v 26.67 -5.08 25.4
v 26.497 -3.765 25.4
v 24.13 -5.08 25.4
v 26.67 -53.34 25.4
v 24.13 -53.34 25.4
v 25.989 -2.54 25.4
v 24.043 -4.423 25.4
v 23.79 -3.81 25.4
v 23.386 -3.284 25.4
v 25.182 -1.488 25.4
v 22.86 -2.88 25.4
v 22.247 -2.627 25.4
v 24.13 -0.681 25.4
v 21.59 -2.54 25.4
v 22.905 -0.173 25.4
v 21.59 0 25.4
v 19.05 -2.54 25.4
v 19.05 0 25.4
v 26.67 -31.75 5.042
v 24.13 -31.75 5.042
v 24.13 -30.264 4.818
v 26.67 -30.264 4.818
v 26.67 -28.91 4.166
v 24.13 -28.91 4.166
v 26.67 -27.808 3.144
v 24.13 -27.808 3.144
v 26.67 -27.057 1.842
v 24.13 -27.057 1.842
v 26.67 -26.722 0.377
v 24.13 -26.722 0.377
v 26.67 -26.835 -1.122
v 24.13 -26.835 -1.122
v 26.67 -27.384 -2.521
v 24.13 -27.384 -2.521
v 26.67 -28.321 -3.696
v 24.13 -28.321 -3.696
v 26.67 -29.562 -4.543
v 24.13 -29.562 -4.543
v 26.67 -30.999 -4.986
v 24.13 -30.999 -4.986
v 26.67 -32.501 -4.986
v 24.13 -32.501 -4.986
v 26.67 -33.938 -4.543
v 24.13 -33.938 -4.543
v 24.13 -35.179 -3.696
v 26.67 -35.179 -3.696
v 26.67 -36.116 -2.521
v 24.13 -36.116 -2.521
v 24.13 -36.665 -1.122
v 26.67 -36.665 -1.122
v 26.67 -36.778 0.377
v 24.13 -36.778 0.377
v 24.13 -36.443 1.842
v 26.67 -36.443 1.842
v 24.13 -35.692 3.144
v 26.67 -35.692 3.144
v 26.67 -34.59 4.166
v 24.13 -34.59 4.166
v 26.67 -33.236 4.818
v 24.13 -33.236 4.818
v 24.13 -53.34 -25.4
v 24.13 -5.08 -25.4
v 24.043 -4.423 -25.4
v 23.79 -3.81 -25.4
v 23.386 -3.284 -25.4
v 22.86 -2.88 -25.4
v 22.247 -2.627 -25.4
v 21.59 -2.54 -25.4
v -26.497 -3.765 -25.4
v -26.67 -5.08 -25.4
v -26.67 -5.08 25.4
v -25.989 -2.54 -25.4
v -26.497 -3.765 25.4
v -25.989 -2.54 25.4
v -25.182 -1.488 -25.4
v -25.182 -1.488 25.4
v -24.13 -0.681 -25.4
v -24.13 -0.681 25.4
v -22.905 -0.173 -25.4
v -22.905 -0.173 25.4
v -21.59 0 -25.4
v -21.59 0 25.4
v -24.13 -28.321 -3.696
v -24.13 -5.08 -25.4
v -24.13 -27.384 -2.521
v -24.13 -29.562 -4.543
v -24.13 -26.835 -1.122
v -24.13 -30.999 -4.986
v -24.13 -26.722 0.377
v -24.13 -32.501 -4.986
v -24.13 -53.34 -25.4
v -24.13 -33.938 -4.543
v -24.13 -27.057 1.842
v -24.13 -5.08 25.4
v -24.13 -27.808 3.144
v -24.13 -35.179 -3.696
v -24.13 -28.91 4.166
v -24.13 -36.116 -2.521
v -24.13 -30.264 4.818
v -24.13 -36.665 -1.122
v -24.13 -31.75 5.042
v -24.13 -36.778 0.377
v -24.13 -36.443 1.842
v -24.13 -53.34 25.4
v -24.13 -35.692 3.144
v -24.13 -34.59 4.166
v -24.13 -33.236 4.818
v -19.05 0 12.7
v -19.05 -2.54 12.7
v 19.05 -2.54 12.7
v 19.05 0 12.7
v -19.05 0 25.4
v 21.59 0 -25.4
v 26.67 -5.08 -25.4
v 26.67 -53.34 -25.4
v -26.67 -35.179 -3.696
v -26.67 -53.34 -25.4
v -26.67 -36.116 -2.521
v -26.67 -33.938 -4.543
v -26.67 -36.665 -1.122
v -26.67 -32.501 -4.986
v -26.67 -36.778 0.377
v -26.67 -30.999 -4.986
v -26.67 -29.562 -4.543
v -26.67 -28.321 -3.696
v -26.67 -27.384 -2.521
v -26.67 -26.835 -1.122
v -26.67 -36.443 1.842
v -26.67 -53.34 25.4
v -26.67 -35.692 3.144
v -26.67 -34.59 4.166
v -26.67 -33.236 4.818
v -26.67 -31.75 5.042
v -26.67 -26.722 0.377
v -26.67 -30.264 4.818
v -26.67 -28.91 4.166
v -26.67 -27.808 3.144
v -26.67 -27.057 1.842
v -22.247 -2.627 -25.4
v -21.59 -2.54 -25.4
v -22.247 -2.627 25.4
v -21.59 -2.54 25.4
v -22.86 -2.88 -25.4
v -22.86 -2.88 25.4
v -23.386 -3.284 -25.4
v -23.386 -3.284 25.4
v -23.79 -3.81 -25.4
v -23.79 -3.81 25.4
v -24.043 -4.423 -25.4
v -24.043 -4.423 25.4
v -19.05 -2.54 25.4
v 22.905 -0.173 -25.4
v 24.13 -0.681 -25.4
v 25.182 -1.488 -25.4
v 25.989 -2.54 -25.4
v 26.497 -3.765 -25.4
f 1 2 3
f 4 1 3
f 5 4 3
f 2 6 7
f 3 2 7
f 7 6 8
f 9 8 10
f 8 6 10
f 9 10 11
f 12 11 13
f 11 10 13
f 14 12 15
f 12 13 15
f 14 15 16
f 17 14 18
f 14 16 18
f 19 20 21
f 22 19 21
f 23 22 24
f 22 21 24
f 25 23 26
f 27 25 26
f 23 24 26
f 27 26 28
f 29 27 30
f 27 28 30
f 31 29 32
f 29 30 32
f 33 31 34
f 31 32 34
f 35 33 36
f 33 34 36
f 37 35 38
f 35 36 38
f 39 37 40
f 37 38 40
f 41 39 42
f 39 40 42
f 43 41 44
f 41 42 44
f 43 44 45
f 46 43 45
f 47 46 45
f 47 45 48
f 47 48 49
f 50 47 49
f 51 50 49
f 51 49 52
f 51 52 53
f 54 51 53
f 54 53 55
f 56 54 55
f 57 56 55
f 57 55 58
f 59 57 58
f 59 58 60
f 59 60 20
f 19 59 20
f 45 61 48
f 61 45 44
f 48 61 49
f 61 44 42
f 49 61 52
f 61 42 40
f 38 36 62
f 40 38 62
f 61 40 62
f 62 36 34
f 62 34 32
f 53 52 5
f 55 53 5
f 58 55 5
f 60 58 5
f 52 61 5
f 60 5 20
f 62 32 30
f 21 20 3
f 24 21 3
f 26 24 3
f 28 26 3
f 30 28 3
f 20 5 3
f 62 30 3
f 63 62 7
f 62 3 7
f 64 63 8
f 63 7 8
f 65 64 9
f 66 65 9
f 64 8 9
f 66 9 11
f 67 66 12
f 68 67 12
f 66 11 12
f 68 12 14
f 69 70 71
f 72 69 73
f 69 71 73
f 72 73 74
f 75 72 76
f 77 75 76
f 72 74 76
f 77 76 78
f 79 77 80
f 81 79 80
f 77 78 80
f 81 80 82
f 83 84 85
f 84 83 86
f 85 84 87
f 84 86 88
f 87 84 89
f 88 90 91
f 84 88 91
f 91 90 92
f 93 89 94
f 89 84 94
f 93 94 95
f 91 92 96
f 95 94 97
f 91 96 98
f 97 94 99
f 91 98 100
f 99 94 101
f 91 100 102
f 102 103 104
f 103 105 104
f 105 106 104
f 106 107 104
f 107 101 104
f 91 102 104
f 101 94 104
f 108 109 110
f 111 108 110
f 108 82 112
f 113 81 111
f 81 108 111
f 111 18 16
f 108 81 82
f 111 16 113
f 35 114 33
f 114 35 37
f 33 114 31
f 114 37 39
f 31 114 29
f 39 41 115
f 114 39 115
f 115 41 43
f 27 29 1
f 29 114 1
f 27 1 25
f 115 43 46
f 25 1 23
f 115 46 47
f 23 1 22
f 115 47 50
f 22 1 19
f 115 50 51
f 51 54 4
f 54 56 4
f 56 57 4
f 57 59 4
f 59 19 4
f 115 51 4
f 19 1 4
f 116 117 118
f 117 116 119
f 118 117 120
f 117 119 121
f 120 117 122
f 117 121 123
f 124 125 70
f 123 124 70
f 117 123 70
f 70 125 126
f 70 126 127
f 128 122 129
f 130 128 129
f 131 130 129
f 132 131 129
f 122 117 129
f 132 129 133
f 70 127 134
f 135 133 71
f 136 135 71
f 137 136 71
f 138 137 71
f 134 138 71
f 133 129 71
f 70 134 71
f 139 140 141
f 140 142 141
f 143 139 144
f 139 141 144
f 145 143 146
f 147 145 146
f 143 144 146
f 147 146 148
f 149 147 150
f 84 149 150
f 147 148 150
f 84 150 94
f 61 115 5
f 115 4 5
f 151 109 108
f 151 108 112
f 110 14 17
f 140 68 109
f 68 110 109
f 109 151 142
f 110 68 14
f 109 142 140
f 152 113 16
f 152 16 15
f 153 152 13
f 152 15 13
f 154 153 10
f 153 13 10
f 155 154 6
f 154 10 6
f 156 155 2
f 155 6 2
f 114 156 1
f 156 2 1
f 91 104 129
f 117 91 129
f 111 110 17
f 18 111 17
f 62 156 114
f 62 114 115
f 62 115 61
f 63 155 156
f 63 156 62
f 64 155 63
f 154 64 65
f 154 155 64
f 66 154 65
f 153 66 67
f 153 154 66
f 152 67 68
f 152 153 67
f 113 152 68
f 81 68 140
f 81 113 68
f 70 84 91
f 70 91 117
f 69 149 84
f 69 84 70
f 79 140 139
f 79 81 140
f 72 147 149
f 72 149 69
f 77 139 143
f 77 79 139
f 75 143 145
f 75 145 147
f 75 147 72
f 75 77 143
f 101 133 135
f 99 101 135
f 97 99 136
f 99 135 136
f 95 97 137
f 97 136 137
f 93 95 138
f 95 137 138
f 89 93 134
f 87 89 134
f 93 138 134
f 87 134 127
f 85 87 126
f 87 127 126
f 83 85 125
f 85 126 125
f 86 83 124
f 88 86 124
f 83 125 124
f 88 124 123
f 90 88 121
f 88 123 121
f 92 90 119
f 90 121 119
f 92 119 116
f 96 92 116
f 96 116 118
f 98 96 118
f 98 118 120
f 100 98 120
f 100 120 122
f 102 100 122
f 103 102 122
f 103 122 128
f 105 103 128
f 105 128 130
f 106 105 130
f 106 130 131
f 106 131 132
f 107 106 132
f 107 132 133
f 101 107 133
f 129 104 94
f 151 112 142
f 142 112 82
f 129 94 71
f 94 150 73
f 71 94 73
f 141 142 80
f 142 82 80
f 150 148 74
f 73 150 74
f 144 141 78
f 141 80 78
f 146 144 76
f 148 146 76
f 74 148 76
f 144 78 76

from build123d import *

# Parameters (mm, degrees)
EXTRUDE_THIN1_DEPTH     = 25.4
F_3_8_CLEARANCE_HOLE1_D = 10.0838
SKETCH4_W               = 38.1
SKETCH4_H               = 12.7
CUT_EXTRUDE1_DEPTH      = 3.54


with BuildPart() as part:
    # Sketch1 → Extrude-Thin1 (new body, symmetric)
    with BuildSketch(Plane.XY):
        with BuildLine():
            Line((-26.67, -53.34), (-26.67, -5.08))
            ThreePointArc((-26.67, -5.08), (-25.182102448, -1.487897552), (-21.59, 0))
            Line((-21.59, 0), (21.59, 0))
            ThreePointArc((21.59, 0), (25.182102448, -1.487897552), (26.67, -5.08))
            Line((26.67, -5.08), (26.67, -53.34))
            Line((26.67, -53.34), (24.13, -53.34))
            Line((24.13, -53.34), (24.13, -5.08))
            ThreePointArc((24.13, -5.08), (23.386051224, -3.283948776), (21.59, -2.54))
            Line((21.59, -2.54), (-21.59, -2.54))
            ThreePointArc((-21.59, -2.54), (-23.386051224, -3.283948776), (-24.13, -5.08))
            Line((-24.13, -5.08), (-24.13, -53.34))
            Line((-24.13, -53.34), (-26.67, -53.34))
        make_face()
    extrude(amount=EXTRUDE_THIN1_DEPTH, both=True)

    # 3/8 Clearance Hole1 (through all)
    with Locations(Plane(origin=(26.67, 0, 0), x_dir=(0, 0, -1), z_dir=(1, 0, 0))):
        with Locations((0, -31.75)):
            Hole(F_3_8_CLEARANCE_HOLE1_D / 2)

    # Sketch4 → Cut-Extrude1 (cut, through all)
    with BuildSketch(Plane.XZ.offset(2.54)):
        with Locations((0, 19.05)):
            Rectangle(SKETCH4_W, SKETCH4_H)
    extrude(amount=-CUT_EXTRUDE1_DEPTH, mode=Mode.SUBTRACT)


solid = part.part
